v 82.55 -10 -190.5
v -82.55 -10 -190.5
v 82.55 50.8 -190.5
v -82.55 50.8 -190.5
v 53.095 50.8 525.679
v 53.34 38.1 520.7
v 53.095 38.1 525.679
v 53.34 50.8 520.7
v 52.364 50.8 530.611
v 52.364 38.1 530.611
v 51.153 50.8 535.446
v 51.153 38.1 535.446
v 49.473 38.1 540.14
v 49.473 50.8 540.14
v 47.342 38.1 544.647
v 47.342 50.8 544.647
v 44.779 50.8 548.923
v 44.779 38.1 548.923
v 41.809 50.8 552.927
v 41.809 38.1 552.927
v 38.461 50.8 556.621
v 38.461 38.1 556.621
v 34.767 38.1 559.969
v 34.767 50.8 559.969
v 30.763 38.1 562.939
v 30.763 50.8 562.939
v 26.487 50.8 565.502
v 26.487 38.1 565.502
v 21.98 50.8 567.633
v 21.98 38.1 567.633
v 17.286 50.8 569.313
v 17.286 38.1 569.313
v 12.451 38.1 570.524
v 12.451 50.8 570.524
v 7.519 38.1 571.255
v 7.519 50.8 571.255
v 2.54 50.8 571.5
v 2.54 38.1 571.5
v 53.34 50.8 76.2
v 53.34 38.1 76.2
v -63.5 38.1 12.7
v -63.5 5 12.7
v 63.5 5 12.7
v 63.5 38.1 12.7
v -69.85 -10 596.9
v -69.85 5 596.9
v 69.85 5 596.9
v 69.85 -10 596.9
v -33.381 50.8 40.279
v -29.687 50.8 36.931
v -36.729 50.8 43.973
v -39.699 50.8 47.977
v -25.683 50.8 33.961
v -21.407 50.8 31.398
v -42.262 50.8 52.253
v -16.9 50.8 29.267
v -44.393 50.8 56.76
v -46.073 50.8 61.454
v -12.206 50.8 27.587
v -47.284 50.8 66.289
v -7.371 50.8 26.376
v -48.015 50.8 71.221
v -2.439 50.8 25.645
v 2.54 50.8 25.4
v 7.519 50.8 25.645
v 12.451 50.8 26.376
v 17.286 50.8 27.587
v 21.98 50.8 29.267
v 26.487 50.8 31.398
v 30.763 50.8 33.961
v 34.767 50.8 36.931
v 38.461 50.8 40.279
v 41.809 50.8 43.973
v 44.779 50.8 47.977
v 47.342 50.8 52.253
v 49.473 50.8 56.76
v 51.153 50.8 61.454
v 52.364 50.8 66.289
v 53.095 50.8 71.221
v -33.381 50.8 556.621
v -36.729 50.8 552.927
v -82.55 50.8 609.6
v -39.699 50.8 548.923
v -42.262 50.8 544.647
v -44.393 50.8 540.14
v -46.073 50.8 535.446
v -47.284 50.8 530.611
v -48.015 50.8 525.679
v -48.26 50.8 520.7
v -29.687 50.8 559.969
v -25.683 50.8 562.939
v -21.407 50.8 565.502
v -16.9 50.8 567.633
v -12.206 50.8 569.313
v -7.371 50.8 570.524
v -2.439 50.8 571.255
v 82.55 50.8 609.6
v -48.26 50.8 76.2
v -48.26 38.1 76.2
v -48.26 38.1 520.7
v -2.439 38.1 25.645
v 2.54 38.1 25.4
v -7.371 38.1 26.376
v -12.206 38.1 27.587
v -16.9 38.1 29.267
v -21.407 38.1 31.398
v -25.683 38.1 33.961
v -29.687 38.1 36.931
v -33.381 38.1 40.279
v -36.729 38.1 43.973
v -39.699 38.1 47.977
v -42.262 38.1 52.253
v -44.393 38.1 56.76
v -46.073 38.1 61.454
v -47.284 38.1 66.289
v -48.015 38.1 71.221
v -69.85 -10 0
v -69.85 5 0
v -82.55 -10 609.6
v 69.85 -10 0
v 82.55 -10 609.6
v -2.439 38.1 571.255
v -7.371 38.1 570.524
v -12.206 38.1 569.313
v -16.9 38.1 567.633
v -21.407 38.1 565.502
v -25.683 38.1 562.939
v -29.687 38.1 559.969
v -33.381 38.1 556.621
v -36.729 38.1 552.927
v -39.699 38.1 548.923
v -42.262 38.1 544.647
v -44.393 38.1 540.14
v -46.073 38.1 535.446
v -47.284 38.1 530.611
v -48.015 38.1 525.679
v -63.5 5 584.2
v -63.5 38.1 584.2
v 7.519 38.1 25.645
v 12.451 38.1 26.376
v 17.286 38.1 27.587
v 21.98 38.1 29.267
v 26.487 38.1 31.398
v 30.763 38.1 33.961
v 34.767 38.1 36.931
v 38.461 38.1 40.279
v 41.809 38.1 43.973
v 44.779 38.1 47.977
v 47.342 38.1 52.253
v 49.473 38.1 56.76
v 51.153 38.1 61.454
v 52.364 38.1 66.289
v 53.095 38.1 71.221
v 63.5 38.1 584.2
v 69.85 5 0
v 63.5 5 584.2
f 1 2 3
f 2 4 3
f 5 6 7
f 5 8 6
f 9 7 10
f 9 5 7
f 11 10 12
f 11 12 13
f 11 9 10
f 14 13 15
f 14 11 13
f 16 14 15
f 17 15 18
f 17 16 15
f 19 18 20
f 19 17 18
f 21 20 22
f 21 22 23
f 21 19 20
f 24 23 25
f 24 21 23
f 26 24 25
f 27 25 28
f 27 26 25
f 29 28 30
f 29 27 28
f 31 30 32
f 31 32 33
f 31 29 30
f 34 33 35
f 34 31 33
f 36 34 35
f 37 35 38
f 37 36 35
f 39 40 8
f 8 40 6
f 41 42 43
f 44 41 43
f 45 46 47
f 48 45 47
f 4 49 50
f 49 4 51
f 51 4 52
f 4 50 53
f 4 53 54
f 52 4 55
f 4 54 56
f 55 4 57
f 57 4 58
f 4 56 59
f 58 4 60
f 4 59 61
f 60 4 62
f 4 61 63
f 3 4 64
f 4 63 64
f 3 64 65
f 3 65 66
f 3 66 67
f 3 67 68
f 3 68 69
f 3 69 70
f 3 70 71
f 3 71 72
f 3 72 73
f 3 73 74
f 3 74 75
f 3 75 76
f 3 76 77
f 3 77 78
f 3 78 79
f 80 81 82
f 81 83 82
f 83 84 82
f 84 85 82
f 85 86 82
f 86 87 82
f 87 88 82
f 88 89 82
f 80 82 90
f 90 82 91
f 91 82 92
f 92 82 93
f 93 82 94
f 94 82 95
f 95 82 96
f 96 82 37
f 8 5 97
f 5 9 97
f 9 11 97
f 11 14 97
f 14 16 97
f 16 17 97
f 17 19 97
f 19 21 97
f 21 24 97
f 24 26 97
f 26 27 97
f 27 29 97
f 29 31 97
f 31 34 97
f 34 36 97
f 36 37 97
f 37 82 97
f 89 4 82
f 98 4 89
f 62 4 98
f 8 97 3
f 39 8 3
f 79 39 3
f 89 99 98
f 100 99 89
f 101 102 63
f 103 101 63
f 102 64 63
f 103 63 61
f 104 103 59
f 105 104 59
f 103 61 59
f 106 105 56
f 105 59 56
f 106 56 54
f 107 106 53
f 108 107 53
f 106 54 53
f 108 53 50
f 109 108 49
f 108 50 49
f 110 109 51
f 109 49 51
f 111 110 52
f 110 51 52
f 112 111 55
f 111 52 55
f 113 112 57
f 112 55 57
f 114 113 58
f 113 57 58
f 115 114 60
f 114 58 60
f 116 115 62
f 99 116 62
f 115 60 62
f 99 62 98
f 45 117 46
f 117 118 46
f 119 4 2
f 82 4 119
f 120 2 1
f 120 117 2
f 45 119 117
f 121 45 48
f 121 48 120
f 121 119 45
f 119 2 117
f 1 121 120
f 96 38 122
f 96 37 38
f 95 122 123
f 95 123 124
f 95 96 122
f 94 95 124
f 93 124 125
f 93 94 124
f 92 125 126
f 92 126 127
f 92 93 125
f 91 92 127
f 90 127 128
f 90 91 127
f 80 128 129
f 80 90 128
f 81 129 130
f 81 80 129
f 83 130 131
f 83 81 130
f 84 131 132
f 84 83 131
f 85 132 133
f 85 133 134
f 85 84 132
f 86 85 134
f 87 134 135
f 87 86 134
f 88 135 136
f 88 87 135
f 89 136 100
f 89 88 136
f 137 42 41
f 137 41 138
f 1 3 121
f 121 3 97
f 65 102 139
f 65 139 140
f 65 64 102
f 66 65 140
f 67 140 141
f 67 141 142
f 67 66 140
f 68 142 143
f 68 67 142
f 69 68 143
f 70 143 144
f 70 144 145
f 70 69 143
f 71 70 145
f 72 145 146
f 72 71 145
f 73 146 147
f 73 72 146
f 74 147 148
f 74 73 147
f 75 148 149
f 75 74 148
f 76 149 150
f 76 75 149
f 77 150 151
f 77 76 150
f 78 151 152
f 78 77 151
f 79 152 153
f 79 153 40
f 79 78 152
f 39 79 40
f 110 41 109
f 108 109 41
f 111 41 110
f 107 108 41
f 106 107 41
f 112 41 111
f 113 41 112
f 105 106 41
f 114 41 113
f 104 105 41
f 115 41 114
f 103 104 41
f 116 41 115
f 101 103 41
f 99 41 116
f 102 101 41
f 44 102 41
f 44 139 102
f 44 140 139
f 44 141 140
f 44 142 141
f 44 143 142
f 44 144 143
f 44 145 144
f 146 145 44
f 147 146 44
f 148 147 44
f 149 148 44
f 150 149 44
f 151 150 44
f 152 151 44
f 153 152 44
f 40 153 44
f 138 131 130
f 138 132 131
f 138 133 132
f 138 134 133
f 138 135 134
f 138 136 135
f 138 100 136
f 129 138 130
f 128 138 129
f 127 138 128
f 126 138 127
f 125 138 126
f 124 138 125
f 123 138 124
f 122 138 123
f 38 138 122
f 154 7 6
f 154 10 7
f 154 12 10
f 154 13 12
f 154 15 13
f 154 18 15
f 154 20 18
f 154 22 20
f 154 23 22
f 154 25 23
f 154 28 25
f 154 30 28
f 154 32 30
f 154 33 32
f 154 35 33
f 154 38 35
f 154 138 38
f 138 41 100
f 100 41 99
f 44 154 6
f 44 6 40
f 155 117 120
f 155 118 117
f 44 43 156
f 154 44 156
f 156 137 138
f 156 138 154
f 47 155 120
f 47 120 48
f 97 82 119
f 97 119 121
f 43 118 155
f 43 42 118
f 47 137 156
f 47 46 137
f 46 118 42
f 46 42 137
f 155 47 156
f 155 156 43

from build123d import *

# Parameters (mm, degrees)
F0_W        = 165.1
F0_H        = 800.1
F0_W_2      = 139.7
F0_H_2      = 596.9
F0_W_3      = 127
F0_H_3      = 571.5
F0_W_4      = 101.6
F0_H_4      = 546.1
F1_DEPTH    = 50.8
F2_DEPTH    = 5
F3_DEPTH    = 38.1
F4_R        = 50.79999
F2_FACE_W   = 165.1
F2_FACE_H   = 800.1
F2_FACE_W_2 = 139.7
F2_FACE_H_2 = 596.9
F5_DEPTH    = 10


# Not quite as in the source:
# - a fillet or chamfer is up to 0.001 mm smaller than in the source, because OpenCascade refuses the exact size
# - a feature names something its author has since deleted; it is built from what else it names


with BuildPart() as f1:
    # F0 (on Front) → F1 (new body)
    with BuildSketch(Plane.XZ):
        with Locations((0, 209.55)):
            Rectangle(F0_W, F0_H)
        with Locations((0, 298.45)):
            Rectangle(F0_W_2, F0_H_2, mode=Mode.SUBTRACT)
        with Locations((0, 298.45)):
            Rectangle(F0_W_2, F0_H_2)
        with Locations((0, 298.45)):
            Rectangle(F0_W_3, F0_H_3, mode=Mode.SUBTRACT)
        with Locations((0, 298.45)):
            Rectangle(F0_W_3, F0_H_3)
        with Locations((2.54, 298.45)):
            Rectangle(F0_W_4, F0_H_4, mode=Mode.SUBTRACT)
    extrude(amount=-F1_DEPTH)

    # F0 (on Front) → F2 (cut)
    with BuildSketch(Plane.XZ):
        with Locations((0, 298.45)):
            Rectangle(F0_W_2, F0_H_2)
        with Locations((0, 298.45)):
            Rectangle(F0_W_3, F0_H_3, mode=Mode.SUBTRACT)
    extrude(amount=-F2_DEPTH, mode=Mode.SUBTRACT)

    # F0 (on Front) → F3 (cut)
    with BuildSketch(Plane.XZ):
        with Locations((0, 298.45)):
            Rectangle(F0_W_3, F0_H_3)
        with Locations((2.54, 298.45)):
            Rectangle(F0_W_4, F0_H_4, mode=Mode.SUBTRACT)
    extrude(amount=-F3_DEPTH, mode=Mode.SUBTRACT)

    # F4 (radius 50.8 in the source; OpenCascade refuses exactly that, so slightly less here)
    f4_edges = [f1.edges().sort_by_distance(p)[0] for p in [
        (53.34, 44.45, 571.5),
        (-48.26, 44.45, 571.5),
        (-48.26, 44.45, 25.4),
        (53.34, 44.45, 25.4),
    ]]
    fillet(f4_edges, radius=F4_R)

    # F0 (on Front) + F2_face (on face) → F5 (join)
    with BuildSketch(Plane.XZ):
        with Locations((0, 209.55)):
            Rectangle(F0_W, F0_H)
        with Locations((0, 298.45)):
            Rectangle(F0_W_2, F0_H_2, mode=Mode.SUBTRACT)
    with BuildSketch(Plane(origin=(0, 0, 57.3602649007), x_dir=(1, 0, 0), z_dir=(0, -1, 0))):
        with Locations((0, 152.1897350993)):
            Rectangle(F2_FACE_W, F2_FACE_H)
        with Locations((0, 241.0897350993)):
            Rectangle(F2_FACE_W_2, F2_FACE_H_2, mode=Mode.SUBTRACT)
    extrude(amount=F5_DEPTH)


solid = f1.part
